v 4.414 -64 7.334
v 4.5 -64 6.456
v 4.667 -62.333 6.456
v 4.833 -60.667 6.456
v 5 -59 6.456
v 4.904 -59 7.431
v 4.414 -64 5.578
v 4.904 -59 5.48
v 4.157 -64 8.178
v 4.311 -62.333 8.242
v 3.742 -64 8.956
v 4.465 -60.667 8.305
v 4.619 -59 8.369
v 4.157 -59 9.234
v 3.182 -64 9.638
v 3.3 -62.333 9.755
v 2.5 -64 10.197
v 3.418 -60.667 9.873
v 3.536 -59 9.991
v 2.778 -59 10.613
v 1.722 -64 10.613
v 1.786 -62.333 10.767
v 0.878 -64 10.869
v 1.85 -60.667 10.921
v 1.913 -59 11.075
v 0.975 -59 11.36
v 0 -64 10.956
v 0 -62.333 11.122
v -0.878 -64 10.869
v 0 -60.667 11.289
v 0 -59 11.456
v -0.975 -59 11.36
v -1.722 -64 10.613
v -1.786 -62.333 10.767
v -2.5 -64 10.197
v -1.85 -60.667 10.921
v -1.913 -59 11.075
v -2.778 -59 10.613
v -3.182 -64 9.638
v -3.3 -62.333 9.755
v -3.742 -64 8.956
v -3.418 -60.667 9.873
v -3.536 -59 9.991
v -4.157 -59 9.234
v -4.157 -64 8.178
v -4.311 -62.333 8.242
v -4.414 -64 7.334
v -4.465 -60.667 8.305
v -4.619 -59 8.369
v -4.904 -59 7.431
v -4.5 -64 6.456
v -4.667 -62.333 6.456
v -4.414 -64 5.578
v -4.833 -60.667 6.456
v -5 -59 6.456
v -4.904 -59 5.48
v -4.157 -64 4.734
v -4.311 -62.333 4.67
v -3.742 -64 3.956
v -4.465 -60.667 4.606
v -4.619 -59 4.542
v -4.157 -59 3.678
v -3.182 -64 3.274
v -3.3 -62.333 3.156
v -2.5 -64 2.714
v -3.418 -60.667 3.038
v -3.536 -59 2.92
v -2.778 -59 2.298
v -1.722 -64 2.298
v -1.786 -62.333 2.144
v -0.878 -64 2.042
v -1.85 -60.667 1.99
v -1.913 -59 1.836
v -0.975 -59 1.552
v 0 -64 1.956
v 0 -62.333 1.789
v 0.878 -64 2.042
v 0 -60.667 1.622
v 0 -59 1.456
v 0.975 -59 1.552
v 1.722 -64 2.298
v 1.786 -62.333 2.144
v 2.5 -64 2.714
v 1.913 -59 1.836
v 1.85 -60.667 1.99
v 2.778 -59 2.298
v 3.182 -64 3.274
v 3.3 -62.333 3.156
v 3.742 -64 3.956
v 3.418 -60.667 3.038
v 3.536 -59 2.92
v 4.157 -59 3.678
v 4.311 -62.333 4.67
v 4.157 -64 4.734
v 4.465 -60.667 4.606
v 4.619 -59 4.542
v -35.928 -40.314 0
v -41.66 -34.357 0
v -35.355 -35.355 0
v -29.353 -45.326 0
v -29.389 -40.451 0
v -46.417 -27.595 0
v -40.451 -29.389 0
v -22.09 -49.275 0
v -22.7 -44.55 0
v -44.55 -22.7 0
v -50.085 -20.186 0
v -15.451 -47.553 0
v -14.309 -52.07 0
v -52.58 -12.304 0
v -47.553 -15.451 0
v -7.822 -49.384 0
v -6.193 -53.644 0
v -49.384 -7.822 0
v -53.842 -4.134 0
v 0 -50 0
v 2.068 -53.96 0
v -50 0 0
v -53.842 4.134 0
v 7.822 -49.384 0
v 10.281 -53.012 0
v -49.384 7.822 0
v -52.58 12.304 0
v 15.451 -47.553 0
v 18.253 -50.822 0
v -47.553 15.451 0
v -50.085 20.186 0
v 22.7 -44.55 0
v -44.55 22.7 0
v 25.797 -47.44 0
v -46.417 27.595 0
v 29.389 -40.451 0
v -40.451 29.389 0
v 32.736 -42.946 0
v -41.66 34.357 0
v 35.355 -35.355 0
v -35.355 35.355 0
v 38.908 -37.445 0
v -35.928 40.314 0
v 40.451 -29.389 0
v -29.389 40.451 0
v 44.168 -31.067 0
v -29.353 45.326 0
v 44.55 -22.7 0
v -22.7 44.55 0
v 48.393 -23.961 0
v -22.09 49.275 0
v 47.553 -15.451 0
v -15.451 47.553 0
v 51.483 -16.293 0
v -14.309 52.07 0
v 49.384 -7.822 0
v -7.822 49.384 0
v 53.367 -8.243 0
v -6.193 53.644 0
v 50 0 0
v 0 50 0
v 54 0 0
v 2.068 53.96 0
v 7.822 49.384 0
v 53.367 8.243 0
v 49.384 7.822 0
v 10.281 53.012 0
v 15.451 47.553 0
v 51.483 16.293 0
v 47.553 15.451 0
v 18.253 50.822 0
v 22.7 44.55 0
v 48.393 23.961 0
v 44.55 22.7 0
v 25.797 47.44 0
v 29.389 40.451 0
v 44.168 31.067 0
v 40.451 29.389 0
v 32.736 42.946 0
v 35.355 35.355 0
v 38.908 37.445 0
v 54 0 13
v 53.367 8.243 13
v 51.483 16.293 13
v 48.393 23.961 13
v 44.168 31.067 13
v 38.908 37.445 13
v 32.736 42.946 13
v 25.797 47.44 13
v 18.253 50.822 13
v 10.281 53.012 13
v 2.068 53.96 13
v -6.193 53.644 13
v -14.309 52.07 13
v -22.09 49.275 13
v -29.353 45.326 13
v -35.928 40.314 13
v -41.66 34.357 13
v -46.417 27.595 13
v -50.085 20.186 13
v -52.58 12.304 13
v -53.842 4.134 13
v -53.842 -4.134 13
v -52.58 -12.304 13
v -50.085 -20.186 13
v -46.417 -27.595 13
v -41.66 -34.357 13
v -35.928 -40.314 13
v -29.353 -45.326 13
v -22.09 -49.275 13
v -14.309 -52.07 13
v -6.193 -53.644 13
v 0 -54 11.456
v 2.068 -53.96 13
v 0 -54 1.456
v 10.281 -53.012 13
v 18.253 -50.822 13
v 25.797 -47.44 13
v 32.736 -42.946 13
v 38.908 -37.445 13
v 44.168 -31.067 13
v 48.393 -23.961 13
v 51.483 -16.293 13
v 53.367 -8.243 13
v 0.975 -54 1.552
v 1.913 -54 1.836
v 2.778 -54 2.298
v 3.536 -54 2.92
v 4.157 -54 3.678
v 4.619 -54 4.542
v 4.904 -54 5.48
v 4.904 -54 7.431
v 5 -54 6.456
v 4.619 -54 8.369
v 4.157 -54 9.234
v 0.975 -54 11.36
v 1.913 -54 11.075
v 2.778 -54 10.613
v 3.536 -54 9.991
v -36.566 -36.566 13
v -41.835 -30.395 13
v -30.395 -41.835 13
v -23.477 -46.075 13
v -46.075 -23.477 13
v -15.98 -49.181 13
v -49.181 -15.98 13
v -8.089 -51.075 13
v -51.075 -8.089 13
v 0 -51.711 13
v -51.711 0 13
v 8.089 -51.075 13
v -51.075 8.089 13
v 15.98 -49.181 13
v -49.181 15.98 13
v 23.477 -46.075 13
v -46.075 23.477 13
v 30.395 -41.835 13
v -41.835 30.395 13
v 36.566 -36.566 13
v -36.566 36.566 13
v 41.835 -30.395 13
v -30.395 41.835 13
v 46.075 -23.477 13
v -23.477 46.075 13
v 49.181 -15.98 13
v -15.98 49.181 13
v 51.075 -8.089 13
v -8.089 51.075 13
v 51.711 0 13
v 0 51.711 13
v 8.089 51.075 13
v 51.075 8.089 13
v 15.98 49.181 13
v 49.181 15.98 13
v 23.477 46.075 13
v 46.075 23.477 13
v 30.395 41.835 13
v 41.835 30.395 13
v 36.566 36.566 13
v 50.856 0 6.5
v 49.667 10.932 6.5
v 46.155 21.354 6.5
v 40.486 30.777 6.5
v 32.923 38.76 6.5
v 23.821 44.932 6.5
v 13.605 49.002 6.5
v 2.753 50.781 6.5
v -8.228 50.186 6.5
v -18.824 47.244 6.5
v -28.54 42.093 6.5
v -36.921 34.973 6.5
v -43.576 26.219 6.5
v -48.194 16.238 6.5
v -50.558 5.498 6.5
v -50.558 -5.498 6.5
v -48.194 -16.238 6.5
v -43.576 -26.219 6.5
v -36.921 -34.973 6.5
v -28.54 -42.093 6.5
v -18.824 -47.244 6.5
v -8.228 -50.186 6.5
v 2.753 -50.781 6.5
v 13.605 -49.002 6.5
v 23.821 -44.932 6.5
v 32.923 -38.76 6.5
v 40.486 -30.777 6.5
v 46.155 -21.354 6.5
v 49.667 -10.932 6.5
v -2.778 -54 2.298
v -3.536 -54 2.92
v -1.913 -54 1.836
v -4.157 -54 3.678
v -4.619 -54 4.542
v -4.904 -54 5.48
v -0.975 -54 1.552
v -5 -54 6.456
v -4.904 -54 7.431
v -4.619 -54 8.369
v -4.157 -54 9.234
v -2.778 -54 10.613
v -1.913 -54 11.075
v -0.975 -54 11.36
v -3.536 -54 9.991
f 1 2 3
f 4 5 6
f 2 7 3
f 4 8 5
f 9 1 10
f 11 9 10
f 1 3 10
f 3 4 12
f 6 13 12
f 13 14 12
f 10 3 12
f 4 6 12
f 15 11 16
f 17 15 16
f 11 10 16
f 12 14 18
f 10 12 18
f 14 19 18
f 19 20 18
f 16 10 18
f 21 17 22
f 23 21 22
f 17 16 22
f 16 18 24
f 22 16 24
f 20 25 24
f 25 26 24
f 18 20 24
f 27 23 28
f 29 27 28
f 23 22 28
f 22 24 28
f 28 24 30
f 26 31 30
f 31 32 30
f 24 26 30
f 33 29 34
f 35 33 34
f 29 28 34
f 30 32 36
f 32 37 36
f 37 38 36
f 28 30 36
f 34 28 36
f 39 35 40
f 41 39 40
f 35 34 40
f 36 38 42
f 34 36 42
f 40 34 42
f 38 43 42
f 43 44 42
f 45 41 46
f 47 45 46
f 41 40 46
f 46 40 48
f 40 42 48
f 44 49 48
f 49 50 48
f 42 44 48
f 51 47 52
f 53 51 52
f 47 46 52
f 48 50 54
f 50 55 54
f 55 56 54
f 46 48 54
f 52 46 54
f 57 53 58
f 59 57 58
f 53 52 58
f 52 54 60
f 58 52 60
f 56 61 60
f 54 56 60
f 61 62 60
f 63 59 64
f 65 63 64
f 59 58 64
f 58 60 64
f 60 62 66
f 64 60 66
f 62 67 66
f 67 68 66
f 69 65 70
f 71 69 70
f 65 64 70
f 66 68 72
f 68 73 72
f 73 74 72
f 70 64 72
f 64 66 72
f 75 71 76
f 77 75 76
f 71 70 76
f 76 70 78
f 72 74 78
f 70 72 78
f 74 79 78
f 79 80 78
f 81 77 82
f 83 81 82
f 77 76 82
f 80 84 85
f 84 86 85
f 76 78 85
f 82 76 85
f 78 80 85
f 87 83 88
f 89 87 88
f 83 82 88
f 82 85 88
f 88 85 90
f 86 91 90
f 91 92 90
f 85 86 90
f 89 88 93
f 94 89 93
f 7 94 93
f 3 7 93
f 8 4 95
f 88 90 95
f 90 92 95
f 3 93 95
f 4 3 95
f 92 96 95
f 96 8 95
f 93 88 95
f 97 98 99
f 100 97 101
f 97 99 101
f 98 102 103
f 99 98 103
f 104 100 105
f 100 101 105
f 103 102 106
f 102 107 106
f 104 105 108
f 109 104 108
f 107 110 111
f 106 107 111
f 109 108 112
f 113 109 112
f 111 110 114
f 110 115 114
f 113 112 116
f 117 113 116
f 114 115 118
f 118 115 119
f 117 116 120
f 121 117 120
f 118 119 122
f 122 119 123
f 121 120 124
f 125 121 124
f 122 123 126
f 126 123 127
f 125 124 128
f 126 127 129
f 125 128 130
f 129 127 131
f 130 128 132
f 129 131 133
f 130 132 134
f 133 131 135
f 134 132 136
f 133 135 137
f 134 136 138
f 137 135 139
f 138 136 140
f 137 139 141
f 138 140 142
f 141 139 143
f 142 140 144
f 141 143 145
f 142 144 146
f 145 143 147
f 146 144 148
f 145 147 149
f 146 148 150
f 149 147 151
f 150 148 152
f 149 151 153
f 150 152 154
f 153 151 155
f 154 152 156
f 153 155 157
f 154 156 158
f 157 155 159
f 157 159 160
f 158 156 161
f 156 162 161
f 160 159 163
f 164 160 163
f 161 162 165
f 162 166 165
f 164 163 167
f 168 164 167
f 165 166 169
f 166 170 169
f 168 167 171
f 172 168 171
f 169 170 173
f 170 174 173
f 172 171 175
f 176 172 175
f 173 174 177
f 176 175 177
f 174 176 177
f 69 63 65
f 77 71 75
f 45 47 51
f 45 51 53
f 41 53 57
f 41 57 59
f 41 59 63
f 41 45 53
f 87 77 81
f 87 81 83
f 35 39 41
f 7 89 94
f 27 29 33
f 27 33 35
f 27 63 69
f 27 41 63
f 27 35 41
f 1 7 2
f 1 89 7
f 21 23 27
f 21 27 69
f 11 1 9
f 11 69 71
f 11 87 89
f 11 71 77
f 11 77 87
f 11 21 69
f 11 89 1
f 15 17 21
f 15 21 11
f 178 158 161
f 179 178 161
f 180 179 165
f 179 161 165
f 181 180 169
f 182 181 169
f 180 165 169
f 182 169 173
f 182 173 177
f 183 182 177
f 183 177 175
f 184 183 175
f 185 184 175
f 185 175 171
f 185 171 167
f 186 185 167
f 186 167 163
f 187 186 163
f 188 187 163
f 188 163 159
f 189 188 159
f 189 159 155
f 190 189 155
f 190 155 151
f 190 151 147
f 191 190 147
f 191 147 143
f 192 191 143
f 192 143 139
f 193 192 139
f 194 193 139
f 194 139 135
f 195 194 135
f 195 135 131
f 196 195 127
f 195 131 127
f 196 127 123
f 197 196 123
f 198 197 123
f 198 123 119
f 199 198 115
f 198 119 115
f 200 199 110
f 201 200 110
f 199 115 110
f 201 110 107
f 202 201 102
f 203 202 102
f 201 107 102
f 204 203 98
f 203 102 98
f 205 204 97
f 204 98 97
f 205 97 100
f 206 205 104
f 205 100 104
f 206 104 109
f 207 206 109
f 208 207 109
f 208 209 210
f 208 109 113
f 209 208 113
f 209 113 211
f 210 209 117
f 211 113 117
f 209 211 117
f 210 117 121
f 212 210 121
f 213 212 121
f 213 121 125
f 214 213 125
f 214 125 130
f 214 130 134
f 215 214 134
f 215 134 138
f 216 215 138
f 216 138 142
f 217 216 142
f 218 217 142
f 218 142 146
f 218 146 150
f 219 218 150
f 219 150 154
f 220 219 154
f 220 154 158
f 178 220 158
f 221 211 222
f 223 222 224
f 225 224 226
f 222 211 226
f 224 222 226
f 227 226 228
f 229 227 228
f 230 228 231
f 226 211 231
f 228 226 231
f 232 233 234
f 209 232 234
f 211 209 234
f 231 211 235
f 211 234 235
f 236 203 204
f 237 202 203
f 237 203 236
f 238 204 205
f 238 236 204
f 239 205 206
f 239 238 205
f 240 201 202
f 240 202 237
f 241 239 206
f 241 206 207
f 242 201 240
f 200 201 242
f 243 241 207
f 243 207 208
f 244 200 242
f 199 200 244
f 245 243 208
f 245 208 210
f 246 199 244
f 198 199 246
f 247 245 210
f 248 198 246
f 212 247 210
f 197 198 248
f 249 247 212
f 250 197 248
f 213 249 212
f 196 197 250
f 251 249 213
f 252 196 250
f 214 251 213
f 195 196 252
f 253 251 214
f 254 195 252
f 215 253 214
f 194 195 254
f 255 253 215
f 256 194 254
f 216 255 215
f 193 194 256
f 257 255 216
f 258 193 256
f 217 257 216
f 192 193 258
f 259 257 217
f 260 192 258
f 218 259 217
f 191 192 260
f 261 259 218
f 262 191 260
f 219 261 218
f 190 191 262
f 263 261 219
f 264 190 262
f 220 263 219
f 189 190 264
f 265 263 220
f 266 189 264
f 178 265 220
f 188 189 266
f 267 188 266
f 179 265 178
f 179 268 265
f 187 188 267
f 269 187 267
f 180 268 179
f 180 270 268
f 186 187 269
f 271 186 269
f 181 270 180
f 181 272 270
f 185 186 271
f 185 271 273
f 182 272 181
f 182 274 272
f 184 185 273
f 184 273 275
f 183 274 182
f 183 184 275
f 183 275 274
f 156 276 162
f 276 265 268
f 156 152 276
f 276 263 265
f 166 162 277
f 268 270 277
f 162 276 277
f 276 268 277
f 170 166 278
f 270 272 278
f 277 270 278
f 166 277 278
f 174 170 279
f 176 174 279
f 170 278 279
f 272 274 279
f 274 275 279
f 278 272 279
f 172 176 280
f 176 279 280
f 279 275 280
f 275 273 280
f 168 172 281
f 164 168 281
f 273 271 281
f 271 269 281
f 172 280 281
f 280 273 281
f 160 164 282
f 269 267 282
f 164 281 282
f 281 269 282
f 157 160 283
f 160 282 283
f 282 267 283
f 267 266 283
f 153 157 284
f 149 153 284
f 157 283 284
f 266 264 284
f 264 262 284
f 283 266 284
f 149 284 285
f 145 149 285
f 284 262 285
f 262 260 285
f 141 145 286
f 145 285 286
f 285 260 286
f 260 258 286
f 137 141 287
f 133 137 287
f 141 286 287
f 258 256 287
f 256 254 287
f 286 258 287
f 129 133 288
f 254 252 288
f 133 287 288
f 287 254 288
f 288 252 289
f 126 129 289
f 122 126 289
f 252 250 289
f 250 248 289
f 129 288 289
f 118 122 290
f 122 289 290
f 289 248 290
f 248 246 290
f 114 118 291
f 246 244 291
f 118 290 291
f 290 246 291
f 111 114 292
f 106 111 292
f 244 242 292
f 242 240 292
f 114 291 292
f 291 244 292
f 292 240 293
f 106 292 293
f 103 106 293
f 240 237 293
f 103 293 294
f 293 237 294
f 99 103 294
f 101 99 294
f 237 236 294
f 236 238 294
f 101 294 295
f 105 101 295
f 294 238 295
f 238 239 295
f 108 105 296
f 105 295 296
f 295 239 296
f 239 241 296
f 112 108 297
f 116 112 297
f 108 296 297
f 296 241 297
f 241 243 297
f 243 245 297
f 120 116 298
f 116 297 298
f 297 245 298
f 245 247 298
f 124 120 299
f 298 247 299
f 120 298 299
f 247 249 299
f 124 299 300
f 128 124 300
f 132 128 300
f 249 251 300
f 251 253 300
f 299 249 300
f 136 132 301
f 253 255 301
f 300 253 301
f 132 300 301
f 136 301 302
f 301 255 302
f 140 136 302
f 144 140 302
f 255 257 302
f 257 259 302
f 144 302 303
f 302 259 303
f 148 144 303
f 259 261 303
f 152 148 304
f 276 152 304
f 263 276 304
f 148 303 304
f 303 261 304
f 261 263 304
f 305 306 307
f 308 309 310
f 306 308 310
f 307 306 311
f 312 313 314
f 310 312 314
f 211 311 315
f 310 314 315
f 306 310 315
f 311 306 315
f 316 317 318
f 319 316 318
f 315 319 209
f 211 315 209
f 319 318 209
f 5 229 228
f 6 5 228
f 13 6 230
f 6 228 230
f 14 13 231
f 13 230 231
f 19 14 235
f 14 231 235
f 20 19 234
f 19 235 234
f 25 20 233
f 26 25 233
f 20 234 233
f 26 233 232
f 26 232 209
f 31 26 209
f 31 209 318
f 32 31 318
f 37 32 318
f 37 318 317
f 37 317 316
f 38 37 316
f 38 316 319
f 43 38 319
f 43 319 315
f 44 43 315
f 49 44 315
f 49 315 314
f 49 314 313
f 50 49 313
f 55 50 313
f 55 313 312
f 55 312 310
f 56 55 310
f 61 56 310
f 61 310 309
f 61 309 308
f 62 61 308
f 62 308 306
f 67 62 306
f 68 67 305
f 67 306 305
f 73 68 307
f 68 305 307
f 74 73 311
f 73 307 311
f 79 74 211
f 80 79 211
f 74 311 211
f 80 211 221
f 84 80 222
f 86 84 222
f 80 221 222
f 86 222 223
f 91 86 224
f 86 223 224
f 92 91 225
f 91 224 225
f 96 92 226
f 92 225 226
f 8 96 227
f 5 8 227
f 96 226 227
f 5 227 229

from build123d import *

# Parameters (mm, degrees)
F0_R     = 54
F0_R_2   = 50
F1_DEPTH = 13
F3_R     = 5
F4_DEPTH = 10
F5_SIZE2 = 1.711472
F5_SIZE  = 12.99999
F6_SIZE2 = 5
F6_SIZE  = 0.5


# Not quite as in the source:
# - a fillet or chamfer is up to 0.001 mm smaller than in the source, because OpenCascade refuses the exact size


with BuildPart() as f1:
    # F0 (on Top) → F1 (new body)
    with BuildSketch(Plane.XY):
        Circle(F0_R)
        Circle(F0_R_2, mode=Mode.SUBTRACT)
    extrude(amount=F1_DEPTH)

    # F3 (on offset) → F4 (join)
    with BuildSketch(Plane.XZ.offset(54)):
        with Locations((0, 6.4556576599)):
            Circle(F3_R)
    extrude(amount=F4_DEPTH)

    # F5 (size 13 and 1.7114824686 in the source; OpenCascade refuses exactly that, so slightly less here)
    f5_edges = [f1.edges().sort_by_distance(p)[0] for p in [
        (-50, 0, 13),
    ]]
    f5_side = f1.faces().sort_by_distance((-50, 0, 6.5))[0]
    chamfer(f5_edges, length=F5_SIZE, length2=F5_SIZE2, reference=f5_side)

    # F6
    f6_edges = [f1.edges().sort_by_distance(p)[0] for p in [
        (-5, -64, 6.455658),
    ]]
    f6_side = f1.faces().sort_by_distance((0, -64, 6.455658))[0]
    chamfer(f6_edges, length=F6_SIZE, length2=F6_SIZE2, reference=f6_side)


solid = f1.part
